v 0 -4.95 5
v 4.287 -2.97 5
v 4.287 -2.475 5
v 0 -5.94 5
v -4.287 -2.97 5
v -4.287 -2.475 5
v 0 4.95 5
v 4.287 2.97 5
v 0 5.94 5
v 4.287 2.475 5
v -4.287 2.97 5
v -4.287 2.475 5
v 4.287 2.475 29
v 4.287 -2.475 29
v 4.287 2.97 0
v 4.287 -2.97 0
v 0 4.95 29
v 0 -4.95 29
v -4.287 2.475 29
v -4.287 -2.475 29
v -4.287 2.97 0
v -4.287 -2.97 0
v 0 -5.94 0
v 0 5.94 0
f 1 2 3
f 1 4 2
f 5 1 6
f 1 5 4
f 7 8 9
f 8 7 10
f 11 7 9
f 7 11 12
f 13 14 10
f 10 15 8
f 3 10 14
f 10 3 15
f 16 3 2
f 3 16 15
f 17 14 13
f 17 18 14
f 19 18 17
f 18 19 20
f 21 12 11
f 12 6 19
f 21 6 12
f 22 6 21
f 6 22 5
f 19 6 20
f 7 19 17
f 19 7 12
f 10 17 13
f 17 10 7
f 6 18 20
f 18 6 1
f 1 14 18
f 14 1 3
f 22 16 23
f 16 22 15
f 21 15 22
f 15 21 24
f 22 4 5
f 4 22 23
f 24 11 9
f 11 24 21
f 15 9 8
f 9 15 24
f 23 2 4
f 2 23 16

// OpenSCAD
// file: hexgon.scad
module extruding_hexgon(height = 4, radius = 5, center = false) {
  linear_extrude(height = height, center=center) {
      rotate([0, 0, 30])
        circle(r=radius, $fn=6);
  }
}

extruding_hexgon(10, 10);
// main file
use <hexgon.scad>
// Minimal angle for a fragment
$fa = 1;
// Minimal size for a fragment
$fs = 0.4;

extruding_hexgon_diameter = 9.9;
extruding_hexgon_height = 4;

cap_height = 5;
cap_diameter = 12;
connector_height = 24;
connector_diameter = 9.9;

// connector part
translate([0, 0, cap_height])
  extruding_hexgon(height=connector_height, radius=connector_diameter/2);

// Cap part
scale([1, 1.2, 1])
extruding_hexgon(height=cap_height, radius=connector_diameter/2);

// Helper to merge the two parts
translate([0, 0, cap_height - 0.1])
  extruding_hexgon(height=0.2, radius=connector_diameter/2);
